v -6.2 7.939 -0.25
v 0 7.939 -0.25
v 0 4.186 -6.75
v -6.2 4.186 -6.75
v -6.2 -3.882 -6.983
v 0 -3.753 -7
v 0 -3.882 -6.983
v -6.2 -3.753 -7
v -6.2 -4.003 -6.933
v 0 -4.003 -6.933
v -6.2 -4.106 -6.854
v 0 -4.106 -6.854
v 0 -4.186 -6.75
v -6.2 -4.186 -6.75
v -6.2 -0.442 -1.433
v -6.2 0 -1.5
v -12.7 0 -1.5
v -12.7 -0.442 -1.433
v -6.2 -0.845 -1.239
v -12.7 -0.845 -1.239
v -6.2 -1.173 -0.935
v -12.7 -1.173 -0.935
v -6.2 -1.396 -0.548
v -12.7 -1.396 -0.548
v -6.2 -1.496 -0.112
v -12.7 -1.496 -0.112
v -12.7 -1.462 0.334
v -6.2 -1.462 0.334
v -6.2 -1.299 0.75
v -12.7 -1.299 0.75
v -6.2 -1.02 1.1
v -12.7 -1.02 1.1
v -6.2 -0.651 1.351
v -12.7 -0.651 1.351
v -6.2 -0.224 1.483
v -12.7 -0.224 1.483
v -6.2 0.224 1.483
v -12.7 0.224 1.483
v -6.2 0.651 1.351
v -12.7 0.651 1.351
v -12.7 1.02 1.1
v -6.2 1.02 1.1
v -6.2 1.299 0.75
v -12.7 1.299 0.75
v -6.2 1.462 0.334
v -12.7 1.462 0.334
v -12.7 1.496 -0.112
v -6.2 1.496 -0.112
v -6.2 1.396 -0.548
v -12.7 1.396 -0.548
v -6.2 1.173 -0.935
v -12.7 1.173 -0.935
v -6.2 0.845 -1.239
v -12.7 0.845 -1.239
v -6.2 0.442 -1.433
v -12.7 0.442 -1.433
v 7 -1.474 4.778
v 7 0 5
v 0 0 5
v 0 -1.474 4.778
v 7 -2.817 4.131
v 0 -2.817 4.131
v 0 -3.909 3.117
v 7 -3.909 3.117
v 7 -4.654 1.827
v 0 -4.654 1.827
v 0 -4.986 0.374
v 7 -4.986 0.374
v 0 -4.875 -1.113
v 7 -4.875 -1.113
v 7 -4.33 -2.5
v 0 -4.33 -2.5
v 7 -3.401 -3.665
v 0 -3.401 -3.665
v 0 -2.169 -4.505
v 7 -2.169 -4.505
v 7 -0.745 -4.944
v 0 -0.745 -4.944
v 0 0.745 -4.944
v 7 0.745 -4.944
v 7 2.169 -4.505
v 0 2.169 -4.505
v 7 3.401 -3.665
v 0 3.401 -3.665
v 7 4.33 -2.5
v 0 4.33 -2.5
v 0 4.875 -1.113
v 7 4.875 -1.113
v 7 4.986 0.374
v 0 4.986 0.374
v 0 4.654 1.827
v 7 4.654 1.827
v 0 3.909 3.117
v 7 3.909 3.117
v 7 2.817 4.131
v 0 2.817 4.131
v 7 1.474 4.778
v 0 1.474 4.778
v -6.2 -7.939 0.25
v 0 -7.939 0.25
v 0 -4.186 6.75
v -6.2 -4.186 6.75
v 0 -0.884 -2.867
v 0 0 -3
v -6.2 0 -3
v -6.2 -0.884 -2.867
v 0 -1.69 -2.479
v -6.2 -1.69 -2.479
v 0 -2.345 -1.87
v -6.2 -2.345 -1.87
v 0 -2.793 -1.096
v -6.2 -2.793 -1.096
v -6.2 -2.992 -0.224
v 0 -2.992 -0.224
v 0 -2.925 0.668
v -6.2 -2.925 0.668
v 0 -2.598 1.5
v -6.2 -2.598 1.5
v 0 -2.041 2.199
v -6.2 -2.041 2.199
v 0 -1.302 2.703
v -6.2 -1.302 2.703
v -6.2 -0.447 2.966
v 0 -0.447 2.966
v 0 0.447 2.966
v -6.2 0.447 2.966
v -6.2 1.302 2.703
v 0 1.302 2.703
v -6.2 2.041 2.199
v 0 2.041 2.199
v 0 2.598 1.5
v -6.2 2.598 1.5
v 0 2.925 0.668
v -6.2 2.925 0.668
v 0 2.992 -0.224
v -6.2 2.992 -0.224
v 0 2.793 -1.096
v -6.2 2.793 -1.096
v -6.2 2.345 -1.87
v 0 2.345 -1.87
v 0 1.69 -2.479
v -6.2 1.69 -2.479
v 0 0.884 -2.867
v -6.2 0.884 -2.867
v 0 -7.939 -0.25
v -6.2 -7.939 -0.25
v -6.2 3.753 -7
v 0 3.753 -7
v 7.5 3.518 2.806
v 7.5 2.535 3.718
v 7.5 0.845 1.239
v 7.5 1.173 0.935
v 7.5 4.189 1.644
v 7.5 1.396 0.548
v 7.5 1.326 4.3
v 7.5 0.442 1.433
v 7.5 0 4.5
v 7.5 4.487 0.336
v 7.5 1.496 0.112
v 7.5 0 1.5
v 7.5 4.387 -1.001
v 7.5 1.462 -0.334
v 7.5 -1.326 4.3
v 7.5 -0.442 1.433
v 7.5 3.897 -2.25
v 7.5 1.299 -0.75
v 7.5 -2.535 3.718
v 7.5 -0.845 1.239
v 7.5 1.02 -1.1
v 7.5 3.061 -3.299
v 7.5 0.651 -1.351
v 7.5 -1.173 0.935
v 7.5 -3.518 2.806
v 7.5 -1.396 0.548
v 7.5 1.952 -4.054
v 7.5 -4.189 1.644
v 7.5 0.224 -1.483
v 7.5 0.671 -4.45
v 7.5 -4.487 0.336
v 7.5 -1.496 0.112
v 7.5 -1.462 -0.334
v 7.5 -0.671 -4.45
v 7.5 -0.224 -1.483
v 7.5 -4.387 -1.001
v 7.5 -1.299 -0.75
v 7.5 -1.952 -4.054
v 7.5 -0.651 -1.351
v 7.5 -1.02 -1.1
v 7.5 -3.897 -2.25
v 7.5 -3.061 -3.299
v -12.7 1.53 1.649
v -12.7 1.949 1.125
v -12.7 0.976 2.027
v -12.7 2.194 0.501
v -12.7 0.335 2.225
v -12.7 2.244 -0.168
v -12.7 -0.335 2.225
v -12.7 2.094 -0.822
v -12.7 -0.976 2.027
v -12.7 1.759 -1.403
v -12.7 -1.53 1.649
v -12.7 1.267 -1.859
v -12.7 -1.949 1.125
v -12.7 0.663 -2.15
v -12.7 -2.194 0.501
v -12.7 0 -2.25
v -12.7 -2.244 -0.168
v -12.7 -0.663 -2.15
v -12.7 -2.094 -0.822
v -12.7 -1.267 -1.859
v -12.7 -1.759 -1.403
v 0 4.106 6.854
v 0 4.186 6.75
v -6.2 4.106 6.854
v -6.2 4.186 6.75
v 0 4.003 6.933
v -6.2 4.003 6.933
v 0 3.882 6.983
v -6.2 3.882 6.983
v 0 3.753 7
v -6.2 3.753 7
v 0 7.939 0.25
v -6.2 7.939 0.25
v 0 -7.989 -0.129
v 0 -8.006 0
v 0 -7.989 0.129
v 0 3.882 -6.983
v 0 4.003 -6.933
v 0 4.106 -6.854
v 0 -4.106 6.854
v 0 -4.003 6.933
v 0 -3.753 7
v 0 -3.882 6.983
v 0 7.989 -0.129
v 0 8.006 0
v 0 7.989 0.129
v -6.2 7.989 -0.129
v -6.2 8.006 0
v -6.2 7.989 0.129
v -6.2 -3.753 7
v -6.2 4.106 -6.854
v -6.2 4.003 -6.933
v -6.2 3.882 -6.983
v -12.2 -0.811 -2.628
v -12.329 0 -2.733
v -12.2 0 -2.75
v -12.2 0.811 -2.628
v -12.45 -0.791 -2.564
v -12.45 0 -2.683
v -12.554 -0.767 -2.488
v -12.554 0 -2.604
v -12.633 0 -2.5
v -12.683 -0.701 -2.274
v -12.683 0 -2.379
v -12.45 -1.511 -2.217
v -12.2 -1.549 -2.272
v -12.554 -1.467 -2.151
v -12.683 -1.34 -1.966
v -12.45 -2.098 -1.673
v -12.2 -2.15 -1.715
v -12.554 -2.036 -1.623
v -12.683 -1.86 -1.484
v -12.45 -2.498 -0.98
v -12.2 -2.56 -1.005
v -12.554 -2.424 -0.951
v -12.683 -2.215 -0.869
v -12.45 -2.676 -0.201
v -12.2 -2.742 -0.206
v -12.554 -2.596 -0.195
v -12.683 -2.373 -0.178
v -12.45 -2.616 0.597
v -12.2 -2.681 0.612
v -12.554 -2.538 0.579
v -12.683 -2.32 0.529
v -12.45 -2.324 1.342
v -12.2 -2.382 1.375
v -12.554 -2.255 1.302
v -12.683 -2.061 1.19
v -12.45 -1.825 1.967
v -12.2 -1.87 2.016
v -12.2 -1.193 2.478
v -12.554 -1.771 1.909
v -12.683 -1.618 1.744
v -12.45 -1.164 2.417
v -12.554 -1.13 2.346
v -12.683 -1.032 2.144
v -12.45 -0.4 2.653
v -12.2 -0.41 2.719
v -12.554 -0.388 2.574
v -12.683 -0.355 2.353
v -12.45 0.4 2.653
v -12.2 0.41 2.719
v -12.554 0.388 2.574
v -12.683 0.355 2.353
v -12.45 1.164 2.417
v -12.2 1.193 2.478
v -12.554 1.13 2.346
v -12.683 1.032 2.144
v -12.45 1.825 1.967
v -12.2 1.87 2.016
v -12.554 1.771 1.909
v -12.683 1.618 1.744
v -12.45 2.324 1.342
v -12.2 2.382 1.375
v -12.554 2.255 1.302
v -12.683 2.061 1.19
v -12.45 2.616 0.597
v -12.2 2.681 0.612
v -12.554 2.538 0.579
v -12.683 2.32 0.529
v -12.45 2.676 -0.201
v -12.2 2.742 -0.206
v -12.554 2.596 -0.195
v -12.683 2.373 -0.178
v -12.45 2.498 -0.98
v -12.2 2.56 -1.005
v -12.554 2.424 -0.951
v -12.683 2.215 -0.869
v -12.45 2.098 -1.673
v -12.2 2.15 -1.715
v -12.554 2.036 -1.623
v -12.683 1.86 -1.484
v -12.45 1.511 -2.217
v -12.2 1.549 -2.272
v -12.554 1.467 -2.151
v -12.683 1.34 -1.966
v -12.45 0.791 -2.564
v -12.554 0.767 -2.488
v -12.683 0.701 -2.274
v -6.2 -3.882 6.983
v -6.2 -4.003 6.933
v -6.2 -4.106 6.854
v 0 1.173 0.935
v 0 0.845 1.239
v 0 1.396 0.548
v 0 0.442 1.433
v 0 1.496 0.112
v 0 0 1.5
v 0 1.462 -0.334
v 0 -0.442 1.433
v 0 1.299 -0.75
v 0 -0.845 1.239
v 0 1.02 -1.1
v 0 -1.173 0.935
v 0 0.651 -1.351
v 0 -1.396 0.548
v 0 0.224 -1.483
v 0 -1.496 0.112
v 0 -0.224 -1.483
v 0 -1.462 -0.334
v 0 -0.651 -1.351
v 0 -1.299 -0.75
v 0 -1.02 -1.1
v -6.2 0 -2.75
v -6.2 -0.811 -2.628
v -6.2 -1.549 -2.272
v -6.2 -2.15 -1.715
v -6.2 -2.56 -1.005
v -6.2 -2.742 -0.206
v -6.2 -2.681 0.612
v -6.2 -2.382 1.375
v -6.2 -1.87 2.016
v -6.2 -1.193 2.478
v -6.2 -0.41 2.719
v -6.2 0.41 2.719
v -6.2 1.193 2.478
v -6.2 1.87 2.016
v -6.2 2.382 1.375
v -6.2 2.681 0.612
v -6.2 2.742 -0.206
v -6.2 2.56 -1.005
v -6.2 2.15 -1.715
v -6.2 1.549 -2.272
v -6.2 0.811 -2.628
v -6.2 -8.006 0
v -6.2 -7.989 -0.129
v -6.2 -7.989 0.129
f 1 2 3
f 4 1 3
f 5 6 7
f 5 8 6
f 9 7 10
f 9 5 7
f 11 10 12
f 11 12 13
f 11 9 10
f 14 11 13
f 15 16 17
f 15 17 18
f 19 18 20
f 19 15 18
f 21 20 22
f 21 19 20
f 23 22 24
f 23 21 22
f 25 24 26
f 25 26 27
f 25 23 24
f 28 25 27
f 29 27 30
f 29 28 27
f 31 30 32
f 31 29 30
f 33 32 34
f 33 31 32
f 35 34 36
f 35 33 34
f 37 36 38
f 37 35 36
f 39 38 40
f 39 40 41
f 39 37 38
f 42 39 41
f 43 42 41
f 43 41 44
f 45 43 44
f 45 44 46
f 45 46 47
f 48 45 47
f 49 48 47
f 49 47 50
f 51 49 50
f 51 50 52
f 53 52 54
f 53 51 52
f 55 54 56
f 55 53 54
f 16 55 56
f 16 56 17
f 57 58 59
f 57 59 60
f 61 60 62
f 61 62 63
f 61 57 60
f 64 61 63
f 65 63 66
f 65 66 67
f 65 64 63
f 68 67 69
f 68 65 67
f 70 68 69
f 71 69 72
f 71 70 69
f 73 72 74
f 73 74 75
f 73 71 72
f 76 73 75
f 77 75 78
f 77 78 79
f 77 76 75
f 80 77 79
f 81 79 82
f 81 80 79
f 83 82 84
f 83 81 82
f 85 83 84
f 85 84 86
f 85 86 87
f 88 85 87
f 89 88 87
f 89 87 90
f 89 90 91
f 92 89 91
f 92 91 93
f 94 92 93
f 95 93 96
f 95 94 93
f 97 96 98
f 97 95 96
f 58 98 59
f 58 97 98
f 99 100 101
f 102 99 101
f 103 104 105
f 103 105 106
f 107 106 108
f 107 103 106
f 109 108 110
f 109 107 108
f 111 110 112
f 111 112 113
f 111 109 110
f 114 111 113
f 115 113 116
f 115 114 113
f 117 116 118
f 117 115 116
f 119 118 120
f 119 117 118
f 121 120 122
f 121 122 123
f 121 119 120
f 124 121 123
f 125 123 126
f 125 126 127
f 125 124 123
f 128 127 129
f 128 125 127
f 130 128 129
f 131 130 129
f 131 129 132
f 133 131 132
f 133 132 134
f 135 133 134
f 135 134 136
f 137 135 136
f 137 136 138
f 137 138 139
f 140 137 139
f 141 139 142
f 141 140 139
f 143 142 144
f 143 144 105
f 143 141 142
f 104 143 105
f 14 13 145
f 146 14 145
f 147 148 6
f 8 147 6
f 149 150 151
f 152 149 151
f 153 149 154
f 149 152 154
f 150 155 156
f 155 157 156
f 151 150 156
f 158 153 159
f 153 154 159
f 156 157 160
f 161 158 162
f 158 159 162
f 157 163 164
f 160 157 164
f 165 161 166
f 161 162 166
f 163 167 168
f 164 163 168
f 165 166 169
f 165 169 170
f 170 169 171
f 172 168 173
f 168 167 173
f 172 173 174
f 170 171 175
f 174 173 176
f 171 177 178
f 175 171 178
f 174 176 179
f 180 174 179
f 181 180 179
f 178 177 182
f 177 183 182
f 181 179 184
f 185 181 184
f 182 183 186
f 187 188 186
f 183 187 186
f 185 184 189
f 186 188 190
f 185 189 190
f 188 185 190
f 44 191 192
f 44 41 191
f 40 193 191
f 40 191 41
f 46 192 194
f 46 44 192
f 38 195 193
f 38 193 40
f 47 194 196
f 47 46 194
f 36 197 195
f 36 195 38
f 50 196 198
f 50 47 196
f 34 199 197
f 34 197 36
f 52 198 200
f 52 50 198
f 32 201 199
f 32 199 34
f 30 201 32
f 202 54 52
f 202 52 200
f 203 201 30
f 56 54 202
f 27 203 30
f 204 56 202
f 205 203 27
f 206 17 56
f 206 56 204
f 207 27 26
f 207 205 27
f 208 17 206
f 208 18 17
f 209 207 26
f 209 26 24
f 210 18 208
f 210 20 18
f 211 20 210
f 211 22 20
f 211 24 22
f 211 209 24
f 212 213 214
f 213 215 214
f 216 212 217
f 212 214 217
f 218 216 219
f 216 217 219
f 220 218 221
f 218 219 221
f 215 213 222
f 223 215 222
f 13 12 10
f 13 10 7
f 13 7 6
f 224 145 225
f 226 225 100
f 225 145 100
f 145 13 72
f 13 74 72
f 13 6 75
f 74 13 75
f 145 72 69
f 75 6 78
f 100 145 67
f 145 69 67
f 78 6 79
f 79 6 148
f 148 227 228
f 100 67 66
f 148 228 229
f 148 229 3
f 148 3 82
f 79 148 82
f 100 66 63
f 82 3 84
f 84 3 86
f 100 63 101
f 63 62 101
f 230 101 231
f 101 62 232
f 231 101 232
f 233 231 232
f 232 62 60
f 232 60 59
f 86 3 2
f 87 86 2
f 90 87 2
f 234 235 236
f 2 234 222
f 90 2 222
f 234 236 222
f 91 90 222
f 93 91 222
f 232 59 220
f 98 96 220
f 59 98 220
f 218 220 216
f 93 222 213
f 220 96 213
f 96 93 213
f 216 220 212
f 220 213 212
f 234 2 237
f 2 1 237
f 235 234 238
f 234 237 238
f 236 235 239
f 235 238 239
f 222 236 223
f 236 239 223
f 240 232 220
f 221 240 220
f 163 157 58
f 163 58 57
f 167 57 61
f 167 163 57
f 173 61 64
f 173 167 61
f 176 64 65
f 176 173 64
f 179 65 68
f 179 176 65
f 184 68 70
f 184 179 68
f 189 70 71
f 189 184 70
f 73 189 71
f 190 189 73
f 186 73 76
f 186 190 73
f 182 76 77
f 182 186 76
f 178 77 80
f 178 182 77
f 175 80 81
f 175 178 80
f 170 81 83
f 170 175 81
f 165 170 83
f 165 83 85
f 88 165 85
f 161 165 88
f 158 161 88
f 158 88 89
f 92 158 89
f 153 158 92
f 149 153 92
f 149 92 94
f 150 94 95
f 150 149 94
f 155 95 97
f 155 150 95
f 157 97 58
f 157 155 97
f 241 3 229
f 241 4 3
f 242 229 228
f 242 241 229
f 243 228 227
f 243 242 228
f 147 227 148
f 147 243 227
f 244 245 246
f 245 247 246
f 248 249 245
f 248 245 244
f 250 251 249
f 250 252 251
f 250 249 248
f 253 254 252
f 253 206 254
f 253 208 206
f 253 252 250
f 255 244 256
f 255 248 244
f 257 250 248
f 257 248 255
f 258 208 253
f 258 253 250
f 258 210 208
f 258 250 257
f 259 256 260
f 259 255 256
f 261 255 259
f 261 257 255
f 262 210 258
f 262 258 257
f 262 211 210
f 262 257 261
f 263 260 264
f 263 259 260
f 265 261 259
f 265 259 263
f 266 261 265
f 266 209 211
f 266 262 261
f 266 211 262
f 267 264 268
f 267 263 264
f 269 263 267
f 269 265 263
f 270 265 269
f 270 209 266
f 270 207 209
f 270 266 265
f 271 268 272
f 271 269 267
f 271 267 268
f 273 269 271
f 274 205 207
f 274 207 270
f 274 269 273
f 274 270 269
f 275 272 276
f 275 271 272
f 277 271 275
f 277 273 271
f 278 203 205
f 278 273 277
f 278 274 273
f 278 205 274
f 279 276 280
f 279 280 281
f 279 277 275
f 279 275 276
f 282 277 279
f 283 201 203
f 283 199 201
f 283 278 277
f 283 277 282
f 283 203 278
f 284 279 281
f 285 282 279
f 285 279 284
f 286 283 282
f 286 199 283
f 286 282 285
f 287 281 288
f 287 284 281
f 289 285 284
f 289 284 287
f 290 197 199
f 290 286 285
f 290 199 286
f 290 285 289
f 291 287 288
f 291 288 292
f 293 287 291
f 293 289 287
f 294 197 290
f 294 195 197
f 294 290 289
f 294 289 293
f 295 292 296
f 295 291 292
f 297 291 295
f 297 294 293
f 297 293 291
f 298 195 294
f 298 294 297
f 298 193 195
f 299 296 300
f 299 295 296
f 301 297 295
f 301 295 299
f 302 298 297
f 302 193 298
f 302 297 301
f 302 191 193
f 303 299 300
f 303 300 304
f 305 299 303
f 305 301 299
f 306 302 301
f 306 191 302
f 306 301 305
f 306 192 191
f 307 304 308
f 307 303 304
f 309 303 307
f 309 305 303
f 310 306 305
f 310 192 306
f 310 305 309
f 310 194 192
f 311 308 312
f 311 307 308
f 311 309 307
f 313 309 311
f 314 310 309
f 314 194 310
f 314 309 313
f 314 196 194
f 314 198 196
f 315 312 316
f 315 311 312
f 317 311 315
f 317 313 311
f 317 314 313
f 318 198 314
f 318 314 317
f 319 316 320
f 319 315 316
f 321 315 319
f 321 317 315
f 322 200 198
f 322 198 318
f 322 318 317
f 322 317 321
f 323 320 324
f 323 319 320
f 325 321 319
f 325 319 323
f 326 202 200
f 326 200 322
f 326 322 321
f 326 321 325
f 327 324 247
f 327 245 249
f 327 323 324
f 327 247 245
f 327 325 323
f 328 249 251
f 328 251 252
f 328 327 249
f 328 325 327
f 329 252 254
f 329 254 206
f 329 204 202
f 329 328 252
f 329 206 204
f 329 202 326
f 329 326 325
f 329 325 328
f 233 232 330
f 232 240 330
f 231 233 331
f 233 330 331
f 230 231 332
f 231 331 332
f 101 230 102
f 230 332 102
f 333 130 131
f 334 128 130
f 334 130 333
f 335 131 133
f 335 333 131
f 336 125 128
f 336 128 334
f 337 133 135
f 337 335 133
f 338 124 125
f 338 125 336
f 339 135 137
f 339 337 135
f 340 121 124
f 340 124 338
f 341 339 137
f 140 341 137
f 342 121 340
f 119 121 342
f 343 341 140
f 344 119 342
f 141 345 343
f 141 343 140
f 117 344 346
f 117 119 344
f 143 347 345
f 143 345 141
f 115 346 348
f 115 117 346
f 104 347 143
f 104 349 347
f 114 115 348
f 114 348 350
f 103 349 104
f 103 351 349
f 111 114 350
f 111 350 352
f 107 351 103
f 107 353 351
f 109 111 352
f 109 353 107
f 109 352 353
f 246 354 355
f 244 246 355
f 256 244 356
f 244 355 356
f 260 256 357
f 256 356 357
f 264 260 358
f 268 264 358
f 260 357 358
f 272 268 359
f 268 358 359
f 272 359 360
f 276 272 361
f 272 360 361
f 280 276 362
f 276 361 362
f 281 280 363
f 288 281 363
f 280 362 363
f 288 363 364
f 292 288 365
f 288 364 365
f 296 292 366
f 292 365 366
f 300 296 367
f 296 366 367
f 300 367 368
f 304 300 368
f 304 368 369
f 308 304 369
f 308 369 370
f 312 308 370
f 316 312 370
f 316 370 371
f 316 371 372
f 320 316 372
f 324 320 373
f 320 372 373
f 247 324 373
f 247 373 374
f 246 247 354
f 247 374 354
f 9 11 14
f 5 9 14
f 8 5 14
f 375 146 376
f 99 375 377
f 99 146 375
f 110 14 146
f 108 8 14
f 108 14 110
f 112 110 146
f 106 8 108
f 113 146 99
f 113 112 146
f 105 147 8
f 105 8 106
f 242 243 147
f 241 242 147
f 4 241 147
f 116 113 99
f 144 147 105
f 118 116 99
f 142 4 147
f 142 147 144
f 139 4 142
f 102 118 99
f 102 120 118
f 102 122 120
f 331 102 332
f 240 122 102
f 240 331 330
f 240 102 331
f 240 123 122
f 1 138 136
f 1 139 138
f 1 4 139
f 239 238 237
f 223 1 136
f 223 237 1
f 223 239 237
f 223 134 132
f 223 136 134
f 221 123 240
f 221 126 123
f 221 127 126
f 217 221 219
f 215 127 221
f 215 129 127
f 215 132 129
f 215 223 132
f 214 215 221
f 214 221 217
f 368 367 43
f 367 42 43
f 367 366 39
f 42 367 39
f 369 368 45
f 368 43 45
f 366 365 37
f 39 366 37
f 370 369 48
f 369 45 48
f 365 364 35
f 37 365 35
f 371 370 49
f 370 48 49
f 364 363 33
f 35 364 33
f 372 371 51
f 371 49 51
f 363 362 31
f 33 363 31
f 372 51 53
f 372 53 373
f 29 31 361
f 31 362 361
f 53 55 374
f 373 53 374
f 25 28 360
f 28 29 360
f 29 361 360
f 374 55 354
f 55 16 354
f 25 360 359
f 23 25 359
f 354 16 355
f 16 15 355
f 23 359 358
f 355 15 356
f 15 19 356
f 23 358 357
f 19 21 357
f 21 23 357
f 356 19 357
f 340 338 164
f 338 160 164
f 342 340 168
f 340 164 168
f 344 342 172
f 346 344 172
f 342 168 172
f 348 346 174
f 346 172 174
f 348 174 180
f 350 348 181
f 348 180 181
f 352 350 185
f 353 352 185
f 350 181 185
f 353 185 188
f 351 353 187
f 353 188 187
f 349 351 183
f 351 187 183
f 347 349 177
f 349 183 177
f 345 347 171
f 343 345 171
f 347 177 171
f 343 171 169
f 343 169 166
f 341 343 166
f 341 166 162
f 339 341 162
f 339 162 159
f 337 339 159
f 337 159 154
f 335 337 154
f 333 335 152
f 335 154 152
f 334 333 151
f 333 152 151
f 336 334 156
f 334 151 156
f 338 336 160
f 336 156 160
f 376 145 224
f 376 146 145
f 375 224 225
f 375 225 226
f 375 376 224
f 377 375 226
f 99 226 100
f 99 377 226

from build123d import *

# Parameters (mm, degrees)
SKETCH_1_W      = 7.5
SKETCH_1_H      = 3.5
SKETCH_2_R      = 3
EXTRUDE_1_DEPTH = 6.2
SKETCH_3_R      = 2.75
SKETCH_3_R_2    = 1.5
EXTRUDE_2_DEPTH = 6.5
FILLET_2_R      = 0.5
CHAMFER_1_SIZE  = 0.5
FILLET_3_R      = 0.5


with BuildPart() as part:
    # Эскиз1 → Повернуть1 (revolve)
    with BuildSketch(Plane.XY, mode=Mode.PRIVATE) as revolve_1_sk:
        with Locations((3.75, 3.25)):
            Rectangle(SKETCH_1_W, SKETCH_1_H)
    revolve(revolve_1_sk.sketch.rotate(Axis((0, 0, 0), (1, 0, 0)), 90), axis=Axis((0, 0, 0), (1, 0, 0)))

    # Эскиз2 → Бобышка-Вытянуть1 (add)
    with BuildSketch(Plane.ZY):
        Polygon((0, 8.082903769), (-7, 4.041451884), (-7, -4.041451884), (0, -8.082903769), (7, -4.041451884), (7, 4.041451884), align=None)
        with Locations(Location((0, 0, 0), (0, 0, 180))):
            Circle(SKETCH_2_R, mode=Mode.SUBTRACT)
    extrude(amount=EXTRUDE_1_DEPTH)

    # Фаска1
    chamfer_1_edges = [part.edges().sort_by_distance(p)[0] for p in [
        (7.5, 0, -5),
    ]]
    chamfer(chamfer_1_edges, length=CHAMFER_1_SIZE)

    # Скругление3
    fillet_3_edges = [part.edges().sort_by_distance(p)[0] for p in [
        (-3.1, 4.041451884, 7),
        (-3.1, 8.082903769, 0),
        (-3.1, 4.041451884, -7),
        (-3.1, -4.041451884, -7),
        (-3.1, -8.082903769, 0),
        (-3.1, -4.041451884, 7),
    ]]
    fillet(fillet_3_edges, radius=FILLET_3_R)


with BuildPart() as body_2:
    # Эскиз3 → Бобышка-Вытянуть2 (new body)
    with BuildSketch(Plane.ZY.offset(6.2)):
        with Locations(Location((0, 0, 0), (0, 0, 180))):
            Circle(SKETCH_3_R)
        with Locations(Location((0, 0, 0), (0, 0, 180))):
            Circle(SKETCH_3_R_2, mode=Mode.SUBTRACT)
    extrude(amount=EXTRUDE_2_DEPTH)

    # Скругление2
    fillet_2_edges = [body_2.edges().sort_by_distance(p)[0] for p in [
        (-12.7, 0, 2.75),
    ]]
    fillet(fillet_2_edges, radius=FILLET_2_R)


solid = Compound([part.part, body_2.part])
